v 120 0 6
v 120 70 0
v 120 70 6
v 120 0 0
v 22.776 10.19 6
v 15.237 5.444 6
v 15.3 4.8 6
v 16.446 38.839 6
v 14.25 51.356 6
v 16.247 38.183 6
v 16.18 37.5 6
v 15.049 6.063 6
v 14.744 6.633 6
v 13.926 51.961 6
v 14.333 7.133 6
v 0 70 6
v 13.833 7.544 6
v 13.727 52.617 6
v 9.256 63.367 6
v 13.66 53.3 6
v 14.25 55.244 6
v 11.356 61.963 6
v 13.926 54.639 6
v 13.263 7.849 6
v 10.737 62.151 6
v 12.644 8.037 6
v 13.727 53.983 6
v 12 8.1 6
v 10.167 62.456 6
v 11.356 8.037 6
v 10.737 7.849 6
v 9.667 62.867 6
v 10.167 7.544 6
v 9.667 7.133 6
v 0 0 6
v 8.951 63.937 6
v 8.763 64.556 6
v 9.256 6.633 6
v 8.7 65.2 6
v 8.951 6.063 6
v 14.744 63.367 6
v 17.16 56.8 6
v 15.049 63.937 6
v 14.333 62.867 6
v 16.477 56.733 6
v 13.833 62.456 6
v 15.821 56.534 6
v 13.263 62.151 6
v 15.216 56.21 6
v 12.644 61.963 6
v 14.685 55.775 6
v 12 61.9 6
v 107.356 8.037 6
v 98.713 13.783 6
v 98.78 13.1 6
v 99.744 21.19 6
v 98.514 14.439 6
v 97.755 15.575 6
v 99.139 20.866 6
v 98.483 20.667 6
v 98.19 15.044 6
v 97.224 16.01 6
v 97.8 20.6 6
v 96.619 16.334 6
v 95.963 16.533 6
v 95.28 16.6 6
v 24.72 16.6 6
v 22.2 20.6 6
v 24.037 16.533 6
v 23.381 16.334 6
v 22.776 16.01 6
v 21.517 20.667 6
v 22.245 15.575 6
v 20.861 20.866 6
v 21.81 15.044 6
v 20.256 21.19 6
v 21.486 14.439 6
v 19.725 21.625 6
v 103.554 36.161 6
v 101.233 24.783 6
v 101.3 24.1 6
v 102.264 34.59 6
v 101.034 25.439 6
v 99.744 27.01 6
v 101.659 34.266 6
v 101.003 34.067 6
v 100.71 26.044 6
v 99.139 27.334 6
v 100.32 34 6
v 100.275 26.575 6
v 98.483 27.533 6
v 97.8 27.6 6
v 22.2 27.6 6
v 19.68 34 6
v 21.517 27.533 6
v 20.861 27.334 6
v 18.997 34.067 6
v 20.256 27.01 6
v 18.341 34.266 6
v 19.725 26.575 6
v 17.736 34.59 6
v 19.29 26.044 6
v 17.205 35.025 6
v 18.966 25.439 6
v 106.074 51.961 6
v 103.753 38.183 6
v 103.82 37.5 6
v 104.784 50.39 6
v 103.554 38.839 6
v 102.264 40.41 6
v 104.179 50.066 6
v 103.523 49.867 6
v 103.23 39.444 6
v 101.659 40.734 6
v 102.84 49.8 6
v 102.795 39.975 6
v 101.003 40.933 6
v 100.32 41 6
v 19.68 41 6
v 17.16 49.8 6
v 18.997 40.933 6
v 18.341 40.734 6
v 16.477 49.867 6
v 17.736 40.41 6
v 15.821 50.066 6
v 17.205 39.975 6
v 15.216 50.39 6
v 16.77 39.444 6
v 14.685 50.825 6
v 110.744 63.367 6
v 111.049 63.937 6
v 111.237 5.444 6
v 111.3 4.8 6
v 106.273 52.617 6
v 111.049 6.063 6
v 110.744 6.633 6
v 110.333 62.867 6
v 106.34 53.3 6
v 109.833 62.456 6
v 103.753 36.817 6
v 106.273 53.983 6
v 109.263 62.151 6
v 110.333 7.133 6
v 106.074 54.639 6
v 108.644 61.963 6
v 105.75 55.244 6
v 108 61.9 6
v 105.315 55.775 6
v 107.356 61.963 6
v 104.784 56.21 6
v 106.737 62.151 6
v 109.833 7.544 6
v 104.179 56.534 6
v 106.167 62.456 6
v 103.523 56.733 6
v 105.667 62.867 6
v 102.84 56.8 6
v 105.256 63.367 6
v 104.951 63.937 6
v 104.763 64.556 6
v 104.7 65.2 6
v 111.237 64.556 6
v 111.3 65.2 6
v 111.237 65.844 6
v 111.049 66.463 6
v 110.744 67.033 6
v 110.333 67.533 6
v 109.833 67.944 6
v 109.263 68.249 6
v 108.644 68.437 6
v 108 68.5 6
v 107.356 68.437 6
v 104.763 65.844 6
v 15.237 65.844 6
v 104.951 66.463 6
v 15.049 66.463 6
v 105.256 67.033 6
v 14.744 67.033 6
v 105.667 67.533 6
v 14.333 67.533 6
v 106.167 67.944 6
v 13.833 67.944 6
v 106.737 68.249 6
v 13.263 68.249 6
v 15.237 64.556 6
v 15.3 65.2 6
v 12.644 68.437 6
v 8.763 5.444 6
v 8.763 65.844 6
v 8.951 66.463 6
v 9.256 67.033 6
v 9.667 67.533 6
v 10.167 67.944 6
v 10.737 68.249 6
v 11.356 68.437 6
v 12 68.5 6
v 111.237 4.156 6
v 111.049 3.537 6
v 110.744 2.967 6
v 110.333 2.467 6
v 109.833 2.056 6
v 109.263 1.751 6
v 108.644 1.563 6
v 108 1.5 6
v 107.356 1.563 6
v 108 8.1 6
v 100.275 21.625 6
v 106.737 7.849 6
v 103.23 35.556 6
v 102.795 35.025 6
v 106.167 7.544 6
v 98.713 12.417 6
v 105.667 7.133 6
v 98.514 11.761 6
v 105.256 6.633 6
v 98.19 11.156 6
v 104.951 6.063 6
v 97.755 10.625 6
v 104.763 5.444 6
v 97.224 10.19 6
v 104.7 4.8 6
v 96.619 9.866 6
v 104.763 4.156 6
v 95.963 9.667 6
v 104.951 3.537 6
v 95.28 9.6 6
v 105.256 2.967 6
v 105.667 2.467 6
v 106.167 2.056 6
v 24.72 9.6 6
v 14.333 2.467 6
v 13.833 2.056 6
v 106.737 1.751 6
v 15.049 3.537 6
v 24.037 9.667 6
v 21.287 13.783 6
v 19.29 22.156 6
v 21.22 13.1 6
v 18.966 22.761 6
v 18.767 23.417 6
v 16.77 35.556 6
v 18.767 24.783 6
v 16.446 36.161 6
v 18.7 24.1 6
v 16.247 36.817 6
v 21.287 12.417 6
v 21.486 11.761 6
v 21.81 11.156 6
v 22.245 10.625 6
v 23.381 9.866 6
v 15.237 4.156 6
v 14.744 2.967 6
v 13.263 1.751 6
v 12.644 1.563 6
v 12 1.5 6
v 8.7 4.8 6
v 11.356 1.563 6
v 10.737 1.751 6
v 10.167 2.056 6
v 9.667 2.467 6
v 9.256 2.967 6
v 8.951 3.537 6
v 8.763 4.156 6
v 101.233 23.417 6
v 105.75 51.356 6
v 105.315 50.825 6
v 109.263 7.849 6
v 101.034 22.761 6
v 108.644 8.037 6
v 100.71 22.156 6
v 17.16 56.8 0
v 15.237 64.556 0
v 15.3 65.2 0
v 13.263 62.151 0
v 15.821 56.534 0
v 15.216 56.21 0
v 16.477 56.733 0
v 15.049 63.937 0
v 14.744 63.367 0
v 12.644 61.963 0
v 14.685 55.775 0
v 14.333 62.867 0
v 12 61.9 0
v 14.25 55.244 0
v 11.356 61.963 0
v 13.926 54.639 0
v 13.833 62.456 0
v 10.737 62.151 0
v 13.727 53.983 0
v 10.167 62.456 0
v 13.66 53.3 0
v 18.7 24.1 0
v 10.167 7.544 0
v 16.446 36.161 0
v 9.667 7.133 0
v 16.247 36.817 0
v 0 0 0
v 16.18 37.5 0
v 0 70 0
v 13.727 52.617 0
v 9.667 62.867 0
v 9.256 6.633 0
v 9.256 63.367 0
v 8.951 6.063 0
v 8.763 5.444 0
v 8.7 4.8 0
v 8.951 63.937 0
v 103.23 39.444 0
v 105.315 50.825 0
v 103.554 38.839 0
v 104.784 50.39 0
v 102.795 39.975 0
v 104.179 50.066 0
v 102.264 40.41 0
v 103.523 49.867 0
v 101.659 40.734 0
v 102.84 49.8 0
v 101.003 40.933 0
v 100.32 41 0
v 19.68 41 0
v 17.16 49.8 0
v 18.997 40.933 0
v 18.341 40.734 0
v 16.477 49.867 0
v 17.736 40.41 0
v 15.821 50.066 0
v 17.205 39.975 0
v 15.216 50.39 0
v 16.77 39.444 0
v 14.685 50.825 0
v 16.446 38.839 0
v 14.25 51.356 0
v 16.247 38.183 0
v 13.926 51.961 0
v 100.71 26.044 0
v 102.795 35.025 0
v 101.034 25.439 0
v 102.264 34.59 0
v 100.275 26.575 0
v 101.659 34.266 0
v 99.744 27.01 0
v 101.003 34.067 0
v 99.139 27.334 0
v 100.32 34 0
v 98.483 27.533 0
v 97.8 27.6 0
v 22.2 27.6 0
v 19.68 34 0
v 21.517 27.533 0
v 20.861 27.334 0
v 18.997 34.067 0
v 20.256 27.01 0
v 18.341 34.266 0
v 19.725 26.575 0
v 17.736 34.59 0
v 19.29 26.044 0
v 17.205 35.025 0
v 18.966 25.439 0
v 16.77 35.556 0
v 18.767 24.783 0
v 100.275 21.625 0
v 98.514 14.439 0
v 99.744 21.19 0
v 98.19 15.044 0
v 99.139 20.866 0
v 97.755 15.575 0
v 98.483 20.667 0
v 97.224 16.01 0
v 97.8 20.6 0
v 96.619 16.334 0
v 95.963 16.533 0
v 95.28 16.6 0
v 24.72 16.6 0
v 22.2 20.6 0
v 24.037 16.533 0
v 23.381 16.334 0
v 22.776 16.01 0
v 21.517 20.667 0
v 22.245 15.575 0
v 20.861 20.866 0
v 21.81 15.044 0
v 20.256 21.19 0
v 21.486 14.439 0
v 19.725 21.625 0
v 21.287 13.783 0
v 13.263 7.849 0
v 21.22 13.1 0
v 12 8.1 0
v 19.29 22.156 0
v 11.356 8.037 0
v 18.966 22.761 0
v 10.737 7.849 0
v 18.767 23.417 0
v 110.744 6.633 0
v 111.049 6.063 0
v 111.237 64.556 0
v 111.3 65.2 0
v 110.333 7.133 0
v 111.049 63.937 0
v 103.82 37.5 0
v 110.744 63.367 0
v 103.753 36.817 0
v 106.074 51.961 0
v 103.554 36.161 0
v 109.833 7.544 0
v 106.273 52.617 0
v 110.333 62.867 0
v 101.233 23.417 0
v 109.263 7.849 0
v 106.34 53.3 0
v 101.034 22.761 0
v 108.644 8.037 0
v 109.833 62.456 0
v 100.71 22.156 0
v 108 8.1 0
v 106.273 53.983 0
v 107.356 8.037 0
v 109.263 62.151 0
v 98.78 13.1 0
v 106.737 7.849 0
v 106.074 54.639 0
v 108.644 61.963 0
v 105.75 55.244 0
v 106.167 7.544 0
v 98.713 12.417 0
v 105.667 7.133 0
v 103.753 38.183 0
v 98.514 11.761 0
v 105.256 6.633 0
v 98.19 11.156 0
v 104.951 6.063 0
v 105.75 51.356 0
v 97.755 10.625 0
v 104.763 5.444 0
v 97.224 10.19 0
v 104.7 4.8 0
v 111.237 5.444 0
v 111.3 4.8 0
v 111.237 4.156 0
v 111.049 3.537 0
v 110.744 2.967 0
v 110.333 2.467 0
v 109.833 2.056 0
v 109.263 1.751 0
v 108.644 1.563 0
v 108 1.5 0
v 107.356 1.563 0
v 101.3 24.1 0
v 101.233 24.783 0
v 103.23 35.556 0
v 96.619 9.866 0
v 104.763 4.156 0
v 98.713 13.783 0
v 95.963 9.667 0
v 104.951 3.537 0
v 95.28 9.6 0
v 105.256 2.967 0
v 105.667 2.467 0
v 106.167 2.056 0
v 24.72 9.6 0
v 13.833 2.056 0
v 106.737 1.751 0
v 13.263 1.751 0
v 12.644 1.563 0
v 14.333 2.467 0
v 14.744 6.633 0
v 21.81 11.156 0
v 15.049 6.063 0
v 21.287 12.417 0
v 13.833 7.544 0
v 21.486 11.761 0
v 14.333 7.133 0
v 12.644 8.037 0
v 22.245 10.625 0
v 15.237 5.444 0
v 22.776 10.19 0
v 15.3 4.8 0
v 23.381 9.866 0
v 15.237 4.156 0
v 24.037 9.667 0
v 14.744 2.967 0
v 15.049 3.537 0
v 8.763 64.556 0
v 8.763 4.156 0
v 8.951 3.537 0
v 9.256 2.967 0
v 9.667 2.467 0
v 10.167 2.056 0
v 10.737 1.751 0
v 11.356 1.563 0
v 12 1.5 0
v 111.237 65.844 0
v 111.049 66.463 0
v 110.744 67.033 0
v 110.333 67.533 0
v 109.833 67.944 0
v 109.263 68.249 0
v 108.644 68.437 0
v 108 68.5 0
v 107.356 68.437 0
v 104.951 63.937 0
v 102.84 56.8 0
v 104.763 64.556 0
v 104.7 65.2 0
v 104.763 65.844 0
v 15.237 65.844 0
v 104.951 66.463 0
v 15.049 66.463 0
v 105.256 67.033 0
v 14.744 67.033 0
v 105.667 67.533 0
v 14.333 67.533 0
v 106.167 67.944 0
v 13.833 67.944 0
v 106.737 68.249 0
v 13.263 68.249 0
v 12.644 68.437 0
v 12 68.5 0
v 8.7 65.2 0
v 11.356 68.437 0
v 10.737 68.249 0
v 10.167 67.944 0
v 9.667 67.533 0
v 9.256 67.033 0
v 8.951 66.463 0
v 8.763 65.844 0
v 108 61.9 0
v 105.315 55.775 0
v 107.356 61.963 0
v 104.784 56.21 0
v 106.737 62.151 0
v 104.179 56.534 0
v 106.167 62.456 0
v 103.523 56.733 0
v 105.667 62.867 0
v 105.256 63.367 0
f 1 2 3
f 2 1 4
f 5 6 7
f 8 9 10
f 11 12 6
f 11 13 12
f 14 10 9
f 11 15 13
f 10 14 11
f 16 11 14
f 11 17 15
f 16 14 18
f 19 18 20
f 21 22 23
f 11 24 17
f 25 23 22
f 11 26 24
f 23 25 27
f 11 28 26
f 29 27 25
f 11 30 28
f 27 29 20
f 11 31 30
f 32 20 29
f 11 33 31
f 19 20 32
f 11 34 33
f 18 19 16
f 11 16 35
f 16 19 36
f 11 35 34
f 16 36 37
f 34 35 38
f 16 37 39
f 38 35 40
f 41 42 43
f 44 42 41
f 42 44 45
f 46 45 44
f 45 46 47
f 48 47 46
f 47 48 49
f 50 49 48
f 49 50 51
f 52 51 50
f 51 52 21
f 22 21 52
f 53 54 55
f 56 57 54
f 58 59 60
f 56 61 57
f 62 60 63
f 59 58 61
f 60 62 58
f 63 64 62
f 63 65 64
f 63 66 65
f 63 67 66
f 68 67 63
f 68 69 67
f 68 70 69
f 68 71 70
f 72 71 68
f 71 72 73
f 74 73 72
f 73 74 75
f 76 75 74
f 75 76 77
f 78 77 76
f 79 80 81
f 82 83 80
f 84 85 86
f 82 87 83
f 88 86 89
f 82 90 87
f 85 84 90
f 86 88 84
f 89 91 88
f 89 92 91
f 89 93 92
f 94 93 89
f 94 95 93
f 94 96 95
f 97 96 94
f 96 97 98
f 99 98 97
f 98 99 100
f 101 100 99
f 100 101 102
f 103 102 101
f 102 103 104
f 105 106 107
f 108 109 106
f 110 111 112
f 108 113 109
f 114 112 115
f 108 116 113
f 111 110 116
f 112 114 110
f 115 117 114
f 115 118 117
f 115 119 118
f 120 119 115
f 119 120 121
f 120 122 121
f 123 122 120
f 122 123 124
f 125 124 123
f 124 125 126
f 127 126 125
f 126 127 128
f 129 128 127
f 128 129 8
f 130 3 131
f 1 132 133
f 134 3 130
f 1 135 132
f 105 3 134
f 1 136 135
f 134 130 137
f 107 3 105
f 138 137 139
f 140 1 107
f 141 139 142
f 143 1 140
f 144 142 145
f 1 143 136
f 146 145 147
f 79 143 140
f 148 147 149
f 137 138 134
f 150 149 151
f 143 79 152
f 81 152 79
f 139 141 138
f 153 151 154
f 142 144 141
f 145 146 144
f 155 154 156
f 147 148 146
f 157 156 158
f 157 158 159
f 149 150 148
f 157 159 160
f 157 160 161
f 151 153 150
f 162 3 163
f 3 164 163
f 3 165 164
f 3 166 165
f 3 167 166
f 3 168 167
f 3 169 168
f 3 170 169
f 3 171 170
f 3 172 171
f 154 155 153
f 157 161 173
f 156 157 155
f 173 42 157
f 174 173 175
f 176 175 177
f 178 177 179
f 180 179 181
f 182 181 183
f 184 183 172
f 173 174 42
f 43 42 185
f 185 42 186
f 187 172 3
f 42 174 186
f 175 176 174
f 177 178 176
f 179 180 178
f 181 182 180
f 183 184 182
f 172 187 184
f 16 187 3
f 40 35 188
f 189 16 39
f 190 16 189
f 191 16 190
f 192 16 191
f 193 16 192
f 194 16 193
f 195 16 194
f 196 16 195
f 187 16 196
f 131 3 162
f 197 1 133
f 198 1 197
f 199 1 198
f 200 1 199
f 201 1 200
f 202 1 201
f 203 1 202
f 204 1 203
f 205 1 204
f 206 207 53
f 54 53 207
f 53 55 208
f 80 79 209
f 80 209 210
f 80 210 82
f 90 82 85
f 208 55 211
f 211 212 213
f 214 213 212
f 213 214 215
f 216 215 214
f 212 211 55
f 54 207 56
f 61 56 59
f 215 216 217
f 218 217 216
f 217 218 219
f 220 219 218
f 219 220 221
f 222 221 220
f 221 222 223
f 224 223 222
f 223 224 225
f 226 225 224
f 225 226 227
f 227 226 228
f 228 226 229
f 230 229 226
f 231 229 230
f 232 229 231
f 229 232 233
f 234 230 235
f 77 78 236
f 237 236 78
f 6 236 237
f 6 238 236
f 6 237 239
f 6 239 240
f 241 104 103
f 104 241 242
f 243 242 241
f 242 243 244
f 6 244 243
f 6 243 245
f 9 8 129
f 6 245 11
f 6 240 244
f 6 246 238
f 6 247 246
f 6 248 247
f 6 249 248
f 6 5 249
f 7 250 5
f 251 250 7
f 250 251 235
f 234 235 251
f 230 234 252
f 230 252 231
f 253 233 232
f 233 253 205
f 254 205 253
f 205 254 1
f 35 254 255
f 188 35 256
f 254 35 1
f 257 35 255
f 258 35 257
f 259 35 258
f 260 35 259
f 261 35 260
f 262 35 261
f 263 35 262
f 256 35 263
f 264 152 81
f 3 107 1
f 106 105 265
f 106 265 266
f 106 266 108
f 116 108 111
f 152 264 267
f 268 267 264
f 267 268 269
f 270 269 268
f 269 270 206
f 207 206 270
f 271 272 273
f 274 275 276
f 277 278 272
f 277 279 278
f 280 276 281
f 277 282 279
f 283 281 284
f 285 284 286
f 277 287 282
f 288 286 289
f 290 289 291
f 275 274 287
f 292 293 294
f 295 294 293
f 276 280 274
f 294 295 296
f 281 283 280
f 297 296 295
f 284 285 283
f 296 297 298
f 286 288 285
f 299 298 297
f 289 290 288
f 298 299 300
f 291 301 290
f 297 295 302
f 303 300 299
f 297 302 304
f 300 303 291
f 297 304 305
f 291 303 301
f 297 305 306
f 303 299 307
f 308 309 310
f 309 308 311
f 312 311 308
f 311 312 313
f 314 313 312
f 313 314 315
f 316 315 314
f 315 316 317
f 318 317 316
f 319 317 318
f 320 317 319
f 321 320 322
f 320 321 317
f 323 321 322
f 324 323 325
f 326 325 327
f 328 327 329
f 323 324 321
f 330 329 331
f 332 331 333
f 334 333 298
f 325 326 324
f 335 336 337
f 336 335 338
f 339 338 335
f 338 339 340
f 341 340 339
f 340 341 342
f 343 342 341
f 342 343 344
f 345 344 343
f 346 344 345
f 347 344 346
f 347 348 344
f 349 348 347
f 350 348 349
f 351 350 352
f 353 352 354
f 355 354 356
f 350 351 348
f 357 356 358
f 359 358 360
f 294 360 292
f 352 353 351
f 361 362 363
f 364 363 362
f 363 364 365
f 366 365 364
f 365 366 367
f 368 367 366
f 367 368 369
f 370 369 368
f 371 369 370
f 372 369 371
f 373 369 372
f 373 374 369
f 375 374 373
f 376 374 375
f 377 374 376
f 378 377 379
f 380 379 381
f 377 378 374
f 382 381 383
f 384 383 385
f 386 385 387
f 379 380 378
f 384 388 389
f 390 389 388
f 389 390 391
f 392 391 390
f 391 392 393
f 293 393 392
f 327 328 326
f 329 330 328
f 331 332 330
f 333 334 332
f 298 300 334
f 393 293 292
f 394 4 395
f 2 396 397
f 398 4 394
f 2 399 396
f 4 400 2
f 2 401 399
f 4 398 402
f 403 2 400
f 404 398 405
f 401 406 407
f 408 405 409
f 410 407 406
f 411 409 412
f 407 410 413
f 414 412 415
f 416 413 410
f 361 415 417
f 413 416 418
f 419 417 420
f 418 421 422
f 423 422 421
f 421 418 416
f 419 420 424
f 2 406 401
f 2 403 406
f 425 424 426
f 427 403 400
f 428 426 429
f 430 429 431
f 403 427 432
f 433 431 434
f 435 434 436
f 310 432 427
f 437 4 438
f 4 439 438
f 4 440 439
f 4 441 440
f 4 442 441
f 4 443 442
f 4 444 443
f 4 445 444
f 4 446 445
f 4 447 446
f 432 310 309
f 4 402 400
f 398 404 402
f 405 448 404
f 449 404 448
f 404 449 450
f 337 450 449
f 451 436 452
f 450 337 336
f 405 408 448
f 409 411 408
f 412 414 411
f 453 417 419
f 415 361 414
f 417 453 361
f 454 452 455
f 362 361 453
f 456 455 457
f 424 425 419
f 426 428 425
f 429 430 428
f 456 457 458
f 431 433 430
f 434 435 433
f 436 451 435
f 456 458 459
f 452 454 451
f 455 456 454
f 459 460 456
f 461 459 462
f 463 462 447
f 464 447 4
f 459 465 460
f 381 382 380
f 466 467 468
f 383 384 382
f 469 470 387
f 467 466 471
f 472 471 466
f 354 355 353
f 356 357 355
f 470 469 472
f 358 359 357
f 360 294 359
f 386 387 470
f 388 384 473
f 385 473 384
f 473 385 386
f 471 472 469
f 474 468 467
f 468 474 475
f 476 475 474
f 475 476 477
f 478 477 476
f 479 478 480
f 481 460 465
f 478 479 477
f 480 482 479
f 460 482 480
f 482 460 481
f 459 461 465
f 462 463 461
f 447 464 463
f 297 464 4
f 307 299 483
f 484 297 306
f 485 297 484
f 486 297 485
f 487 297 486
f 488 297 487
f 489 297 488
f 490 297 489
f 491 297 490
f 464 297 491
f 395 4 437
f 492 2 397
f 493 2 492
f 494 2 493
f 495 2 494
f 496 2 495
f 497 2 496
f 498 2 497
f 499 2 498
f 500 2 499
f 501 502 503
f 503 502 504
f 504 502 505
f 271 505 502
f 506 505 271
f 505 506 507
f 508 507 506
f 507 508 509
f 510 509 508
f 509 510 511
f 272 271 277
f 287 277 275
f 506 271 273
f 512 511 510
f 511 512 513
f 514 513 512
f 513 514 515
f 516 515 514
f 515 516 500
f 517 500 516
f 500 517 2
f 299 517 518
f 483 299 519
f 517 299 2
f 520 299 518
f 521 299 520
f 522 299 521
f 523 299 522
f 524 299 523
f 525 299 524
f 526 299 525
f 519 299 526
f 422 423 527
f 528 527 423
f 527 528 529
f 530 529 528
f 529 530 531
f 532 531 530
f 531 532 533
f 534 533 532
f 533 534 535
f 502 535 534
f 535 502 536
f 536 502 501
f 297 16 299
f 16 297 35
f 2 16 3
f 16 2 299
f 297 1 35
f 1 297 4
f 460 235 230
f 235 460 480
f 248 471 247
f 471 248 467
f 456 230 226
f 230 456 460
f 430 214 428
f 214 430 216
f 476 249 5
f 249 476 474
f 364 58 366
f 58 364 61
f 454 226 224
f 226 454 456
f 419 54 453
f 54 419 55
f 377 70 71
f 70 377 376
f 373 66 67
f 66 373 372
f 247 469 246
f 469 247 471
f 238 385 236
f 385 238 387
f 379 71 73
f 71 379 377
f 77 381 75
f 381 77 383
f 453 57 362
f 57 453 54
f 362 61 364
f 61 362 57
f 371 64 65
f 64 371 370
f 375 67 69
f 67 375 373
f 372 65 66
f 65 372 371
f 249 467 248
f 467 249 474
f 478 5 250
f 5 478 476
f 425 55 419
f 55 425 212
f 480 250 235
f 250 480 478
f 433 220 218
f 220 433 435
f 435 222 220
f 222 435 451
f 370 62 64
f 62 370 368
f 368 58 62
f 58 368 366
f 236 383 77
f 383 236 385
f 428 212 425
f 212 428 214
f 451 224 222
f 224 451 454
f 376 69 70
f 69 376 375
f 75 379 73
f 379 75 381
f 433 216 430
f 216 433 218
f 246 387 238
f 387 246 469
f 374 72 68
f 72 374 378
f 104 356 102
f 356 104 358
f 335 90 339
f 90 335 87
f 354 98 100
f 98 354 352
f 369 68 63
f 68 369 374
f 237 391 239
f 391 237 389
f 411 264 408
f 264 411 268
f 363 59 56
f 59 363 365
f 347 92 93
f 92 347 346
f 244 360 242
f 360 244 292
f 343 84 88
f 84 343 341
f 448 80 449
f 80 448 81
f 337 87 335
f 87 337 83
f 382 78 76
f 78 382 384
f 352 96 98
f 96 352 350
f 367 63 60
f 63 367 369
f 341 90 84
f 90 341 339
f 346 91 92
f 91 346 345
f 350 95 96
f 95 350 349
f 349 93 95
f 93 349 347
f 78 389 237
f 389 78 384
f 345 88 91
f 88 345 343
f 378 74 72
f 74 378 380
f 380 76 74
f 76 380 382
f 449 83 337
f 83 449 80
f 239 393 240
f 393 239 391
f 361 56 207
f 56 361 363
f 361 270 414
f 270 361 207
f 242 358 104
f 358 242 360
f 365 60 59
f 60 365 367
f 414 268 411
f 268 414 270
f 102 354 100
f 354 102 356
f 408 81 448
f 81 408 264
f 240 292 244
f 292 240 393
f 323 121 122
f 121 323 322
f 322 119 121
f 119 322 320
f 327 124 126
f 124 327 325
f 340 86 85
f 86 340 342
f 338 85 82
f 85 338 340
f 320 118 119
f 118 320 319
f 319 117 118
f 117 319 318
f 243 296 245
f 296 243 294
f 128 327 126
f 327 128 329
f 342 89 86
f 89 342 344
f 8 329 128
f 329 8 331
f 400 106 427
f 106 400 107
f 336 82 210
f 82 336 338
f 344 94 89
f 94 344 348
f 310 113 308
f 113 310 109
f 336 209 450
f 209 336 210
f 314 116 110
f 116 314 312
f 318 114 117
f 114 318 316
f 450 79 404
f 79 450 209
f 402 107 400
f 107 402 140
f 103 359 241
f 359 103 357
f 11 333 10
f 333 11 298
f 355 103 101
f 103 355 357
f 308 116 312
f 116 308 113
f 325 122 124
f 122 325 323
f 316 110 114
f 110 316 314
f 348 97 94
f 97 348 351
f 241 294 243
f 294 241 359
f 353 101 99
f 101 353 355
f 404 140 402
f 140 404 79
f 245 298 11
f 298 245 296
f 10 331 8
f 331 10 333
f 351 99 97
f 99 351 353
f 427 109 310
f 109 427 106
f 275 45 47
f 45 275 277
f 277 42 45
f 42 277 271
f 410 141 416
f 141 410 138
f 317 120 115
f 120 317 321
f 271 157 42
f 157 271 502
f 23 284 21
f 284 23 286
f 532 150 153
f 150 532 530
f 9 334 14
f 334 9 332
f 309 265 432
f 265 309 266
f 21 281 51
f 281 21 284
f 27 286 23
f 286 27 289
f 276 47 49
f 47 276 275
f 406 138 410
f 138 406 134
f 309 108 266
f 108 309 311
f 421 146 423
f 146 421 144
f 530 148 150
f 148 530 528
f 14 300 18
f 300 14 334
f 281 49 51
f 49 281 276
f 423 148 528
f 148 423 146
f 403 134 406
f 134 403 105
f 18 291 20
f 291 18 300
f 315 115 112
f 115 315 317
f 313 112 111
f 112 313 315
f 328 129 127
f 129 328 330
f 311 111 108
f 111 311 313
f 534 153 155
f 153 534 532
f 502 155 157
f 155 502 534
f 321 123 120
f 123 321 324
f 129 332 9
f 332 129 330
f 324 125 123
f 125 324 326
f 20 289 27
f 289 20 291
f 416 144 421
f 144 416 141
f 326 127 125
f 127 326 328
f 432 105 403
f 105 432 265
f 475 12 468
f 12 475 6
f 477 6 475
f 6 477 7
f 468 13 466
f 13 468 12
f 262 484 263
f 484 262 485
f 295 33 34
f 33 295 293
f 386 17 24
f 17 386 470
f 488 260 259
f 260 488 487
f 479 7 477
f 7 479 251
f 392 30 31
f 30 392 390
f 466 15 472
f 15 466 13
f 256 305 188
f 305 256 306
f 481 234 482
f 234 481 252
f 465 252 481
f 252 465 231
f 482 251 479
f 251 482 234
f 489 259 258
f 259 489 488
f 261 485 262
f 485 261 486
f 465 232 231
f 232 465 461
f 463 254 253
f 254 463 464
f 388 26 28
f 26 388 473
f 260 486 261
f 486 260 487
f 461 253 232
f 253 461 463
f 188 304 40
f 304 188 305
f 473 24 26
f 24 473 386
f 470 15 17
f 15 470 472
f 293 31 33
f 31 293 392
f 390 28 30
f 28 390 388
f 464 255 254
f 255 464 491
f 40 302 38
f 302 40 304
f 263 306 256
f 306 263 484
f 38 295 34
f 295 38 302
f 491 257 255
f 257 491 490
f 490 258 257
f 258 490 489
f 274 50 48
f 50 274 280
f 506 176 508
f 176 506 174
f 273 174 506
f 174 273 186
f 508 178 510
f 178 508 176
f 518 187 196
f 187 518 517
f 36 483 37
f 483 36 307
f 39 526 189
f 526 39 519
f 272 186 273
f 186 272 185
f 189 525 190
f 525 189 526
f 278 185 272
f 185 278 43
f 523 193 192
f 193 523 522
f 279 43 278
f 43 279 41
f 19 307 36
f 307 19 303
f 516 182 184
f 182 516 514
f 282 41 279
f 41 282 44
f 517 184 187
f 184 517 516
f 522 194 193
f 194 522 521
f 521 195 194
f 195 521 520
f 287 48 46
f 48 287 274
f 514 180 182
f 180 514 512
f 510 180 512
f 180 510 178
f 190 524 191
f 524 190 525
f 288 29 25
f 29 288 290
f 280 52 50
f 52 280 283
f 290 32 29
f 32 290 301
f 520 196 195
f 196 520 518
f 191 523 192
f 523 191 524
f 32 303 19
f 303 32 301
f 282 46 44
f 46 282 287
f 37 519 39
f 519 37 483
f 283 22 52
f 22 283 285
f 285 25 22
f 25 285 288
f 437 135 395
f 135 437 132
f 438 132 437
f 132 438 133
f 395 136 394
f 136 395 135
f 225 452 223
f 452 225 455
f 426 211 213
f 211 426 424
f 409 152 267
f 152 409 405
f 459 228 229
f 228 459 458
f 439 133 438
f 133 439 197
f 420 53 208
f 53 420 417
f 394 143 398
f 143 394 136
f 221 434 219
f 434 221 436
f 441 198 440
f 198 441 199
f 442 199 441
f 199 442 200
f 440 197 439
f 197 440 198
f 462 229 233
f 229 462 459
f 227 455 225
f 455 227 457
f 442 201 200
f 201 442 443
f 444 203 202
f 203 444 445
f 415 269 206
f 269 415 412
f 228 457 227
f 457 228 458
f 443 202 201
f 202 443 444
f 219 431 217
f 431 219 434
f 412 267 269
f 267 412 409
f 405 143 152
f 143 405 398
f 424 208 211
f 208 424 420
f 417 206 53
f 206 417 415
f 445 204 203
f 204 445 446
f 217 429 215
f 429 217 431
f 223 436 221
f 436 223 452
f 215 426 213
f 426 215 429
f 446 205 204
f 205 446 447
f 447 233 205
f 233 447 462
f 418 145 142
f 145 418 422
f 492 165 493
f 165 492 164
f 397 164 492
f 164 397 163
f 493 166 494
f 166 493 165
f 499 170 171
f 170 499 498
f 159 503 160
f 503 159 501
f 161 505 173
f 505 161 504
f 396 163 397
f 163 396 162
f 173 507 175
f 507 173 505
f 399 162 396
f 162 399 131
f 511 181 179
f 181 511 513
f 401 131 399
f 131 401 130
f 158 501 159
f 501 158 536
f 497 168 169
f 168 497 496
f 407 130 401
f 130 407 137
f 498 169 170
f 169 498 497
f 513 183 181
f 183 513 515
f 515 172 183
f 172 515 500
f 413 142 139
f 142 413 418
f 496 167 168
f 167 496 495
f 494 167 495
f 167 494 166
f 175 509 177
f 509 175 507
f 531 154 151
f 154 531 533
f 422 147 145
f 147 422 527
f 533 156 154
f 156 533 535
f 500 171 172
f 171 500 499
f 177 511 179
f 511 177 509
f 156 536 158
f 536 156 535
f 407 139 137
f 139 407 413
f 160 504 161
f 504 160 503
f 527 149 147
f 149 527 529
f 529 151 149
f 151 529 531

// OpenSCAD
$fn = 32;

// ----------------------------------------------------------------------
// Slotted panel: 120 x 70 mm, 4 ряда of slots
// ----------------------------------------------------------------------

// --- parameters (mm) ---
panel_w = 120;            // panel width
panel_d = 70;             // panel depth
thick = 6;                // panel thickness
slot_w = 7;               // slot width
pitch0 = 11;              // first row pitch
pitch_step = 2.4;         // pitch increase per row
margin = 9.6;             // margin around the slot field
rows = 4;                 // number of slot rows
mount_d = 6.6;            // mounting holes
mount_x = 48;             // mounting hole offset

difference() {
  union() {
    cube([panel_w, panel_d, thick]);
  }
  /* slot rows: stadium shaped cutters, 2.5 mm clear of both faces */
  /* row 0: pitch 11, length 70.56 */
  hull() {
    translate([24.72, 13.1, -2.5]) cylinder(h = thick + 5, d = slot_w);
    translate([95.28, 13.1, -2.5]) cylinder(h = thick + 5, d = slot_w);
  }
  /* row 1: pitch 13.4, length 75.6 */
  hull() {
    translate([22.2, 24.1, -2.5]) cylinder(h = thick + 5, d = slot_w);
    translate([97.8, 24.1, -2.5]) cylinder(h = thick + 5, d = slot_w);
  }
  /* row 2: pitch 15.8, length 80.64 */
  hull() {
    translate([19.68, 37.5, -2.5]) cylinder(h = thick + 5, d = slot_w);
    translate([100.32, 37.5, -2.5]) cylinder(h = thick + 5, d = slot_w);
  }
  /* row 3: pitch 18.2, length 85.68 */
  hull() {
    translate([17.16, 53.3, -2.5]) cylinder(h = thick + 5, d = slot_w);
    translate([102.84, 53.3, -2.5]) cylinder(h = thick + 5, d = slot_w);
  }
  translate([12, 4.8, -2.5]) cylinder(h = 11, d = mount_d);
  translate([12, 65.2, -2.5]) cylinder(h = 11, d = mount_d);
  translate([108, 4.8, -2.5]) cylinder(h = 11, d = mount_d);
  translate([108, 65.2, -2.5]) cylinder(h = 11, d = mount_d);
}
